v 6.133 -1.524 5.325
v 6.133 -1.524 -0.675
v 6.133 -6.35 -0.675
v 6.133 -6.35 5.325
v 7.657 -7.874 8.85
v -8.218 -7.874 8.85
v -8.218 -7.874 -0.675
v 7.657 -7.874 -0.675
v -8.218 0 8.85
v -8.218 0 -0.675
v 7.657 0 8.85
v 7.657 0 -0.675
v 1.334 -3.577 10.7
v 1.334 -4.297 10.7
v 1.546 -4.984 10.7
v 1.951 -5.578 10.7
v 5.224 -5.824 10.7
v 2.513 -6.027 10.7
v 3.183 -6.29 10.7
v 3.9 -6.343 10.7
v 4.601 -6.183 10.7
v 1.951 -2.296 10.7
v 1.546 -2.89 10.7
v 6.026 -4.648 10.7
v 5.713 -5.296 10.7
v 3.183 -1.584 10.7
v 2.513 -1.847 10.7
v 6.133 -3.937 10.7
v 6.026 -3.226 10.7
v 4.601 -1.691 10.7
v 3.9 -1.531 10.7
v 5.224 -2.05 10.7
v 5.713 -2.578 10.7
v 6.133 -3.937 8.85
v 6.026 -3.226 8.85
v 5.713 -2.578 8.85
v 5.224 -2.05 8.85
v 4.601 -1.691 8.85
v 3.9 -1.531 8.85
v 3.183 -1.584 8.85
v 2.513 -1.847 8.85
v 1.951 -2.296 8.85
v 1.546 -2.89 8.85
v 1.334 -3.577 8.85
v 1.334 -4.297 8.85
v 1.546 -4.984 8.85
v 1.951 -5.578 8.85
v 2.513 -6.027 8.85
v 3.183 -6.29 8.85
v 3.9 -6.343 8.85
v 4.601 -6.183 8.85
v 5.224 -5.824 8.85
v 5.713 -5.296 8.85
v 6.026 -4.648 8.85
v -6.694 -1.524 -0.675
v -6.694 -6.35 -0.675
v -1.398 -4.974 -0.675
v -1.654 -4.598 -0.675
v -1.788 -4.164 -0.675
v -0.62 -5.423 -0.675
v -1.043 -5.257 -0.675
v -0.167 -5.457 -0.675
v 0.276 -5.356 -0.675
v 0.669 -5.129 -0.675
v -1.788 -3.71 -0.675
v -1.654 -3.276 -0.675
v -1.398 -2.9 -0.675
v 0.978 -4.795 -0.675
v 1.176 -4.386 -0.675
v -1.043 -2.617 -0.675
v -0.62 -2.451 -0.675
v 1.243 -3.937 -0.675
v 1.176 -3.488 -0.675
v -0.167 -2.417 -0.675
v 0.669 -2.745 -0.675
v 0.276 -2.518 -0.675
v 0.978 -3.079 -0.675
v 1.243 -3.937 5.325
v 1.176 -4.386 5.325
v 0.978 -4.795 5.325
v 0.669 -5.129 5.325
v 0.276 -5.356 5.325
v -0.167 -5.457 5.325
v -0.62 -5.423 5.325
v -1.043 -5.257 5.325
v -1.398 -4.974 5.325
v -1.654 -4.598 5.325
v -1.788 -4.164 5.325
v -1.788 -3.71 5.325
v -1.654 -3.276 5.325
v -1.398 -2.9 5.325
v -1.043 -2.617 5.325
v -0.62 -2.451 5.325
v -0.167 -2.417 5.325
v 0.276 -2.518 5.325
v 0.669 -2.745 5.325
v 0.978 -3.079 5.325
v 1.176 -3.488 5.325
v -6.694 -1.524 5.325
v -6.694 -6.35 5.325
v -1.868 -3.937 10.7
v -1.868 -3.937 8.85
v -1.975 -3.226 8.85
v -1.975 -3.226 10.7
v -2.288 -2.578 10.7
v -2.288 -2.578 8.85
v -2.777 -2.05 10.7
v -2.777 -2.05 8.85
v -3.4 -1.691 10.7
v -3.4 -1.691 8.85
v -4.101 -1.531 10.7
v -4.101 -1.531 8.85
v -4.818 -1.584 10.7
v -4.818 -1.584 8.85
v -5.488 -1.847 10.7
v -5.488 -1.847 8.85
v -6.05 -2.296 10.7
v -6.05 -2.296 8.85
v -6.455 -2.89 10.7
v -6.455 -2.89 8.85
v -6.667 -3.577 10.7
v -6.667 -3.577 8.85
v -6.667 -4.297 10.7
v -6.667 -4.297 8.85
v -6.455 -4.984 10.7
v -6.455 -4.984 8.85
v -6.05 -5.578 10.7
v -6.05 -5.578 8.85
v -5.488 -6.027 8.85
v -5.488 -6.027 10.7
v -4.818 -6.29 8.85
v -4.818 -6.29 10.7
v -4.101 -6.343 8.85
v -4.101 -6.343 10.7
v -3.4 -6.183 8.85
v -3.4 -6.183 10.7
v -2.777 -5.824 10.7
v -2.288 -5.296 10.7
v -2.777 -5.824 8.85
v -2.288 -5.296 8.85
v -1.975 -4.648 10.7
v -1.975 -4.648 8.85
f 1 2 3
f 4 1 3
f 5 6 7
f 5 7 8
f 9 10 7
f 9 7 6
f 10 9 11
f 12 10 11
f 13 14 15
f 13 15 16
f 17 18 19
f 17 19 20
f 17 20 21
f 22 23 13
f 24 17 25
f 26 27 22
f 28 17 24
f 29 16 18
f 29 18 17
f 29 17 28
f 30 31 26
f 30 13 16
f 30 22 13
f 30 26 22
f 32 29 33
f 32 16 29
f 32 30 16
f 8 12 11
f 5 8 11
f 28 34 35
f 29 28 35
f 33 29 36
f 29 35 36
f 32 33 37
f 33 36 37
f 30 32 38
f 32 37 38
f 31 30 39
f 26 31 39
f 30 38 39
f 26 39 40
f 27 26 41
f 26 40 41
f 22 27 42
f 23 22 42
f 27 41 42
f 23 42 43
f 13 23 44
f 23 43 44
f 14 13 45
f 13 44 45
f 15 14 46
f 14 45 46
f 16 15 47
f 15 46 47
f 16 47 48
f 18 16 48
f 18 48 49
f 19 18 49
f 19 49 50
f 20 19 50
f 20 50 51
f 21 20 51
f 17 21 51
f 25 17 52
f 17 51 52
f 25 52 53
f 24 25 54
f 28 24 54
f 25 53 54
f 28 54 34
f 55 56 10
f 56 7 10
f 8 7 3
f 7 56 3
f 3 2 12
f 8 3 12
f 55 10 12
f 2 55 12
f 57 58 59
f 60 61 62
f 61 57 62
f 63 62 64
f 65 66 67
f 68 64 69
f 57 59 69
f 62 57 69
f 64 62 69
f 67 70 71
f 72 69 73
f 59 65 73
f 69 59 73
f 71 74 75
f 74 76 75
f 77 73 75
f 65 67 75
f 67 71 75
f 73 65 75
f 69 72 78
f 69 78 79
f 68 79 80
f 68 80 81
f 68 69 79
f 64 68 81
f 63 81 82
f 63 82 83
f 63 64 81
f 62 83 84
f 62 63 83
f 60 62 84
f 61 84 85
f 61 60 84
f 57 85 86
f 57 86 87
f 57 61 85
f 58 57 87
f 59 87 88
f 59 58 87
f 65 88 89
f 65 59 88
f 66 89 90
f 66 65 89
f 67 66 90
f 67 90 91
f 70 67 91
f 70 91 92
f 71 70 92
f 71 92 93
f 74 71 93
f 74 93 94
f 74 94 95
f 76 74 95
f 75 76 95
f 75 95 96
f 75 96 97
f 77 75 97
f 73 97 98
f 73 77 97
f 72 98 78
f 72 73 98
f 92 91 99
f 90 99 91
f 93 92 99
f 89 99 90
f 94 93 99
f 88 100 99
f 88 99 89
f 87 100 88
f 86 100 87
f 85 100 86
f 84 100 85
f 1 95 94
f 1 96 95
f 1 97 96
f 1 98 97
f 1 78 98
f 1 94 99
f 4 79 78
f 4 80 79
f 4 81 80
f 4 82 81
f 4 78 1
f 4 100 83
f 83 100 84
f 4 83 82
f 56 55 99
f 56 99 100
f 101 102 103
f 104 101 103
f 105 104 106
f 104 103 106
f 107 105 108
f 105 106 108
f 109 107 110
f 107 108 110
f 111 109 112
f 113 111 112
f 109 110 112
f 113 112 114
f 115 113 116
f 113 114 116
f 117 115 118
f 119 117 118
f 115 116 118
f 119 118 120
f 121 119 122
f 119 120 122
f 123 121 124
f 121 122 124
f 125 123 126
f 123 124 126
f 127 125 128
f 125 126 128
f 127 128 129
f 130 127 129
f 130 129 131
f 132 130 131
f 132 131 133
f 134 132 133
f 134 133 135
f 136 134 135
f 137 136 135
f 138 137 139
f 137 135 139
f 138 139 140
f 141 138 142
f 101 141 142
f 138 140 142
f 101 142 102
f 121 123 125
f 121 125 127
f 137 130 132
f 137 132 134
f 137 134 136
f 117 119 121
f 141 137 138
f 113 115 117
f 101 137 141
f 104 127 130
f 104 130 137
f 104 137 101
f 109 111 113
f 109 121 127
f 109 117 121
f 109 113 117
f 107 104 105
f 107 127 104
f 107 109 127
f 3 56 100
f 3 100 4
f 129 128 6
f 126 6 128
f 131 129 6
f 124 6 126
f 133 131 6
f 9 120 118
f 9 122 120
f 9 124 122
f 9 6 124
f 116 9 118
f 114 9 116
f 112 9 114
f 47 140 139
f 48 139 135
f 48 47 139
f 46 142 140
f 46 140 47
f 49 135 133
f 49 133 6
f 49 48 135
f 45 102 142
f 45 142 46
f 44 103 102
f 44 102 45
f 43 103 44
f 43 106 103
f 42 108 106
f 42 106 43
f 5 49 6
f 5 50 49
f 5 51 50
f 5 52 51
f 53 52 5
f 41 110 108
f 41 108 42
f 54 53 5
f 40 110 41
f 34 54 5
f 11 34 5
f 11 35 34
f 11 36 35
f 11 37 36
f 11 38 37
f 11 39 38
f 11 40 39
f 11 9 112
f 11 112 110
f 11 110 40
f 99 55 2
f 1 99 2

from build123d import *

# Parameters (mm, degrees)
F0_W     = 15.875
F0_H     = 9.525
F1_DEPTH = 7.874
F2_R     = 2.413
F3_DEPTH = 1.85
F4_W     = 12.827
F4_H     = 4.826
F4_R     = 1.524
F5_DEPTH = 6


with BuildPart() as f1:
    # F0 (on Front) → F1 (new body)
    with BuildSketch(Plane.XZ):
        with Locations((-0.280751, 4.087655)):
            Rectangle(F0_W, F0_H)
    extrude(amount=F1_DEPTH)

    # F2 (on face) → F3 (join)
    with BuildSketch(Plane.XY.offset(8.850155)):
        with Locations((-4.281251, -3.937)):
            Circle(F2_R)
        with Locations((3.719749, -3.937)):
            Circle(F2_R)
    extrude(amount=F3_DEPTH)

    # F4 (on face) → F5 (cut)
    with BuildSketch(Plane(origin=(0, 0, -0.674845), x_dir=(1, 0, 0), z_dir=(0, 0, -1))):
        with Locations((-0.280751, 3.937)):
            Rectangle(F4_W, F4_H)
        with Locations((-0.280751, 3.937)):
            Circle(F4_R, mode=Mode.SUBTRACT)
    extrude(amount=-F5_DEPTH, mode=Mode.SUBTRACT)


solid = f1.part
